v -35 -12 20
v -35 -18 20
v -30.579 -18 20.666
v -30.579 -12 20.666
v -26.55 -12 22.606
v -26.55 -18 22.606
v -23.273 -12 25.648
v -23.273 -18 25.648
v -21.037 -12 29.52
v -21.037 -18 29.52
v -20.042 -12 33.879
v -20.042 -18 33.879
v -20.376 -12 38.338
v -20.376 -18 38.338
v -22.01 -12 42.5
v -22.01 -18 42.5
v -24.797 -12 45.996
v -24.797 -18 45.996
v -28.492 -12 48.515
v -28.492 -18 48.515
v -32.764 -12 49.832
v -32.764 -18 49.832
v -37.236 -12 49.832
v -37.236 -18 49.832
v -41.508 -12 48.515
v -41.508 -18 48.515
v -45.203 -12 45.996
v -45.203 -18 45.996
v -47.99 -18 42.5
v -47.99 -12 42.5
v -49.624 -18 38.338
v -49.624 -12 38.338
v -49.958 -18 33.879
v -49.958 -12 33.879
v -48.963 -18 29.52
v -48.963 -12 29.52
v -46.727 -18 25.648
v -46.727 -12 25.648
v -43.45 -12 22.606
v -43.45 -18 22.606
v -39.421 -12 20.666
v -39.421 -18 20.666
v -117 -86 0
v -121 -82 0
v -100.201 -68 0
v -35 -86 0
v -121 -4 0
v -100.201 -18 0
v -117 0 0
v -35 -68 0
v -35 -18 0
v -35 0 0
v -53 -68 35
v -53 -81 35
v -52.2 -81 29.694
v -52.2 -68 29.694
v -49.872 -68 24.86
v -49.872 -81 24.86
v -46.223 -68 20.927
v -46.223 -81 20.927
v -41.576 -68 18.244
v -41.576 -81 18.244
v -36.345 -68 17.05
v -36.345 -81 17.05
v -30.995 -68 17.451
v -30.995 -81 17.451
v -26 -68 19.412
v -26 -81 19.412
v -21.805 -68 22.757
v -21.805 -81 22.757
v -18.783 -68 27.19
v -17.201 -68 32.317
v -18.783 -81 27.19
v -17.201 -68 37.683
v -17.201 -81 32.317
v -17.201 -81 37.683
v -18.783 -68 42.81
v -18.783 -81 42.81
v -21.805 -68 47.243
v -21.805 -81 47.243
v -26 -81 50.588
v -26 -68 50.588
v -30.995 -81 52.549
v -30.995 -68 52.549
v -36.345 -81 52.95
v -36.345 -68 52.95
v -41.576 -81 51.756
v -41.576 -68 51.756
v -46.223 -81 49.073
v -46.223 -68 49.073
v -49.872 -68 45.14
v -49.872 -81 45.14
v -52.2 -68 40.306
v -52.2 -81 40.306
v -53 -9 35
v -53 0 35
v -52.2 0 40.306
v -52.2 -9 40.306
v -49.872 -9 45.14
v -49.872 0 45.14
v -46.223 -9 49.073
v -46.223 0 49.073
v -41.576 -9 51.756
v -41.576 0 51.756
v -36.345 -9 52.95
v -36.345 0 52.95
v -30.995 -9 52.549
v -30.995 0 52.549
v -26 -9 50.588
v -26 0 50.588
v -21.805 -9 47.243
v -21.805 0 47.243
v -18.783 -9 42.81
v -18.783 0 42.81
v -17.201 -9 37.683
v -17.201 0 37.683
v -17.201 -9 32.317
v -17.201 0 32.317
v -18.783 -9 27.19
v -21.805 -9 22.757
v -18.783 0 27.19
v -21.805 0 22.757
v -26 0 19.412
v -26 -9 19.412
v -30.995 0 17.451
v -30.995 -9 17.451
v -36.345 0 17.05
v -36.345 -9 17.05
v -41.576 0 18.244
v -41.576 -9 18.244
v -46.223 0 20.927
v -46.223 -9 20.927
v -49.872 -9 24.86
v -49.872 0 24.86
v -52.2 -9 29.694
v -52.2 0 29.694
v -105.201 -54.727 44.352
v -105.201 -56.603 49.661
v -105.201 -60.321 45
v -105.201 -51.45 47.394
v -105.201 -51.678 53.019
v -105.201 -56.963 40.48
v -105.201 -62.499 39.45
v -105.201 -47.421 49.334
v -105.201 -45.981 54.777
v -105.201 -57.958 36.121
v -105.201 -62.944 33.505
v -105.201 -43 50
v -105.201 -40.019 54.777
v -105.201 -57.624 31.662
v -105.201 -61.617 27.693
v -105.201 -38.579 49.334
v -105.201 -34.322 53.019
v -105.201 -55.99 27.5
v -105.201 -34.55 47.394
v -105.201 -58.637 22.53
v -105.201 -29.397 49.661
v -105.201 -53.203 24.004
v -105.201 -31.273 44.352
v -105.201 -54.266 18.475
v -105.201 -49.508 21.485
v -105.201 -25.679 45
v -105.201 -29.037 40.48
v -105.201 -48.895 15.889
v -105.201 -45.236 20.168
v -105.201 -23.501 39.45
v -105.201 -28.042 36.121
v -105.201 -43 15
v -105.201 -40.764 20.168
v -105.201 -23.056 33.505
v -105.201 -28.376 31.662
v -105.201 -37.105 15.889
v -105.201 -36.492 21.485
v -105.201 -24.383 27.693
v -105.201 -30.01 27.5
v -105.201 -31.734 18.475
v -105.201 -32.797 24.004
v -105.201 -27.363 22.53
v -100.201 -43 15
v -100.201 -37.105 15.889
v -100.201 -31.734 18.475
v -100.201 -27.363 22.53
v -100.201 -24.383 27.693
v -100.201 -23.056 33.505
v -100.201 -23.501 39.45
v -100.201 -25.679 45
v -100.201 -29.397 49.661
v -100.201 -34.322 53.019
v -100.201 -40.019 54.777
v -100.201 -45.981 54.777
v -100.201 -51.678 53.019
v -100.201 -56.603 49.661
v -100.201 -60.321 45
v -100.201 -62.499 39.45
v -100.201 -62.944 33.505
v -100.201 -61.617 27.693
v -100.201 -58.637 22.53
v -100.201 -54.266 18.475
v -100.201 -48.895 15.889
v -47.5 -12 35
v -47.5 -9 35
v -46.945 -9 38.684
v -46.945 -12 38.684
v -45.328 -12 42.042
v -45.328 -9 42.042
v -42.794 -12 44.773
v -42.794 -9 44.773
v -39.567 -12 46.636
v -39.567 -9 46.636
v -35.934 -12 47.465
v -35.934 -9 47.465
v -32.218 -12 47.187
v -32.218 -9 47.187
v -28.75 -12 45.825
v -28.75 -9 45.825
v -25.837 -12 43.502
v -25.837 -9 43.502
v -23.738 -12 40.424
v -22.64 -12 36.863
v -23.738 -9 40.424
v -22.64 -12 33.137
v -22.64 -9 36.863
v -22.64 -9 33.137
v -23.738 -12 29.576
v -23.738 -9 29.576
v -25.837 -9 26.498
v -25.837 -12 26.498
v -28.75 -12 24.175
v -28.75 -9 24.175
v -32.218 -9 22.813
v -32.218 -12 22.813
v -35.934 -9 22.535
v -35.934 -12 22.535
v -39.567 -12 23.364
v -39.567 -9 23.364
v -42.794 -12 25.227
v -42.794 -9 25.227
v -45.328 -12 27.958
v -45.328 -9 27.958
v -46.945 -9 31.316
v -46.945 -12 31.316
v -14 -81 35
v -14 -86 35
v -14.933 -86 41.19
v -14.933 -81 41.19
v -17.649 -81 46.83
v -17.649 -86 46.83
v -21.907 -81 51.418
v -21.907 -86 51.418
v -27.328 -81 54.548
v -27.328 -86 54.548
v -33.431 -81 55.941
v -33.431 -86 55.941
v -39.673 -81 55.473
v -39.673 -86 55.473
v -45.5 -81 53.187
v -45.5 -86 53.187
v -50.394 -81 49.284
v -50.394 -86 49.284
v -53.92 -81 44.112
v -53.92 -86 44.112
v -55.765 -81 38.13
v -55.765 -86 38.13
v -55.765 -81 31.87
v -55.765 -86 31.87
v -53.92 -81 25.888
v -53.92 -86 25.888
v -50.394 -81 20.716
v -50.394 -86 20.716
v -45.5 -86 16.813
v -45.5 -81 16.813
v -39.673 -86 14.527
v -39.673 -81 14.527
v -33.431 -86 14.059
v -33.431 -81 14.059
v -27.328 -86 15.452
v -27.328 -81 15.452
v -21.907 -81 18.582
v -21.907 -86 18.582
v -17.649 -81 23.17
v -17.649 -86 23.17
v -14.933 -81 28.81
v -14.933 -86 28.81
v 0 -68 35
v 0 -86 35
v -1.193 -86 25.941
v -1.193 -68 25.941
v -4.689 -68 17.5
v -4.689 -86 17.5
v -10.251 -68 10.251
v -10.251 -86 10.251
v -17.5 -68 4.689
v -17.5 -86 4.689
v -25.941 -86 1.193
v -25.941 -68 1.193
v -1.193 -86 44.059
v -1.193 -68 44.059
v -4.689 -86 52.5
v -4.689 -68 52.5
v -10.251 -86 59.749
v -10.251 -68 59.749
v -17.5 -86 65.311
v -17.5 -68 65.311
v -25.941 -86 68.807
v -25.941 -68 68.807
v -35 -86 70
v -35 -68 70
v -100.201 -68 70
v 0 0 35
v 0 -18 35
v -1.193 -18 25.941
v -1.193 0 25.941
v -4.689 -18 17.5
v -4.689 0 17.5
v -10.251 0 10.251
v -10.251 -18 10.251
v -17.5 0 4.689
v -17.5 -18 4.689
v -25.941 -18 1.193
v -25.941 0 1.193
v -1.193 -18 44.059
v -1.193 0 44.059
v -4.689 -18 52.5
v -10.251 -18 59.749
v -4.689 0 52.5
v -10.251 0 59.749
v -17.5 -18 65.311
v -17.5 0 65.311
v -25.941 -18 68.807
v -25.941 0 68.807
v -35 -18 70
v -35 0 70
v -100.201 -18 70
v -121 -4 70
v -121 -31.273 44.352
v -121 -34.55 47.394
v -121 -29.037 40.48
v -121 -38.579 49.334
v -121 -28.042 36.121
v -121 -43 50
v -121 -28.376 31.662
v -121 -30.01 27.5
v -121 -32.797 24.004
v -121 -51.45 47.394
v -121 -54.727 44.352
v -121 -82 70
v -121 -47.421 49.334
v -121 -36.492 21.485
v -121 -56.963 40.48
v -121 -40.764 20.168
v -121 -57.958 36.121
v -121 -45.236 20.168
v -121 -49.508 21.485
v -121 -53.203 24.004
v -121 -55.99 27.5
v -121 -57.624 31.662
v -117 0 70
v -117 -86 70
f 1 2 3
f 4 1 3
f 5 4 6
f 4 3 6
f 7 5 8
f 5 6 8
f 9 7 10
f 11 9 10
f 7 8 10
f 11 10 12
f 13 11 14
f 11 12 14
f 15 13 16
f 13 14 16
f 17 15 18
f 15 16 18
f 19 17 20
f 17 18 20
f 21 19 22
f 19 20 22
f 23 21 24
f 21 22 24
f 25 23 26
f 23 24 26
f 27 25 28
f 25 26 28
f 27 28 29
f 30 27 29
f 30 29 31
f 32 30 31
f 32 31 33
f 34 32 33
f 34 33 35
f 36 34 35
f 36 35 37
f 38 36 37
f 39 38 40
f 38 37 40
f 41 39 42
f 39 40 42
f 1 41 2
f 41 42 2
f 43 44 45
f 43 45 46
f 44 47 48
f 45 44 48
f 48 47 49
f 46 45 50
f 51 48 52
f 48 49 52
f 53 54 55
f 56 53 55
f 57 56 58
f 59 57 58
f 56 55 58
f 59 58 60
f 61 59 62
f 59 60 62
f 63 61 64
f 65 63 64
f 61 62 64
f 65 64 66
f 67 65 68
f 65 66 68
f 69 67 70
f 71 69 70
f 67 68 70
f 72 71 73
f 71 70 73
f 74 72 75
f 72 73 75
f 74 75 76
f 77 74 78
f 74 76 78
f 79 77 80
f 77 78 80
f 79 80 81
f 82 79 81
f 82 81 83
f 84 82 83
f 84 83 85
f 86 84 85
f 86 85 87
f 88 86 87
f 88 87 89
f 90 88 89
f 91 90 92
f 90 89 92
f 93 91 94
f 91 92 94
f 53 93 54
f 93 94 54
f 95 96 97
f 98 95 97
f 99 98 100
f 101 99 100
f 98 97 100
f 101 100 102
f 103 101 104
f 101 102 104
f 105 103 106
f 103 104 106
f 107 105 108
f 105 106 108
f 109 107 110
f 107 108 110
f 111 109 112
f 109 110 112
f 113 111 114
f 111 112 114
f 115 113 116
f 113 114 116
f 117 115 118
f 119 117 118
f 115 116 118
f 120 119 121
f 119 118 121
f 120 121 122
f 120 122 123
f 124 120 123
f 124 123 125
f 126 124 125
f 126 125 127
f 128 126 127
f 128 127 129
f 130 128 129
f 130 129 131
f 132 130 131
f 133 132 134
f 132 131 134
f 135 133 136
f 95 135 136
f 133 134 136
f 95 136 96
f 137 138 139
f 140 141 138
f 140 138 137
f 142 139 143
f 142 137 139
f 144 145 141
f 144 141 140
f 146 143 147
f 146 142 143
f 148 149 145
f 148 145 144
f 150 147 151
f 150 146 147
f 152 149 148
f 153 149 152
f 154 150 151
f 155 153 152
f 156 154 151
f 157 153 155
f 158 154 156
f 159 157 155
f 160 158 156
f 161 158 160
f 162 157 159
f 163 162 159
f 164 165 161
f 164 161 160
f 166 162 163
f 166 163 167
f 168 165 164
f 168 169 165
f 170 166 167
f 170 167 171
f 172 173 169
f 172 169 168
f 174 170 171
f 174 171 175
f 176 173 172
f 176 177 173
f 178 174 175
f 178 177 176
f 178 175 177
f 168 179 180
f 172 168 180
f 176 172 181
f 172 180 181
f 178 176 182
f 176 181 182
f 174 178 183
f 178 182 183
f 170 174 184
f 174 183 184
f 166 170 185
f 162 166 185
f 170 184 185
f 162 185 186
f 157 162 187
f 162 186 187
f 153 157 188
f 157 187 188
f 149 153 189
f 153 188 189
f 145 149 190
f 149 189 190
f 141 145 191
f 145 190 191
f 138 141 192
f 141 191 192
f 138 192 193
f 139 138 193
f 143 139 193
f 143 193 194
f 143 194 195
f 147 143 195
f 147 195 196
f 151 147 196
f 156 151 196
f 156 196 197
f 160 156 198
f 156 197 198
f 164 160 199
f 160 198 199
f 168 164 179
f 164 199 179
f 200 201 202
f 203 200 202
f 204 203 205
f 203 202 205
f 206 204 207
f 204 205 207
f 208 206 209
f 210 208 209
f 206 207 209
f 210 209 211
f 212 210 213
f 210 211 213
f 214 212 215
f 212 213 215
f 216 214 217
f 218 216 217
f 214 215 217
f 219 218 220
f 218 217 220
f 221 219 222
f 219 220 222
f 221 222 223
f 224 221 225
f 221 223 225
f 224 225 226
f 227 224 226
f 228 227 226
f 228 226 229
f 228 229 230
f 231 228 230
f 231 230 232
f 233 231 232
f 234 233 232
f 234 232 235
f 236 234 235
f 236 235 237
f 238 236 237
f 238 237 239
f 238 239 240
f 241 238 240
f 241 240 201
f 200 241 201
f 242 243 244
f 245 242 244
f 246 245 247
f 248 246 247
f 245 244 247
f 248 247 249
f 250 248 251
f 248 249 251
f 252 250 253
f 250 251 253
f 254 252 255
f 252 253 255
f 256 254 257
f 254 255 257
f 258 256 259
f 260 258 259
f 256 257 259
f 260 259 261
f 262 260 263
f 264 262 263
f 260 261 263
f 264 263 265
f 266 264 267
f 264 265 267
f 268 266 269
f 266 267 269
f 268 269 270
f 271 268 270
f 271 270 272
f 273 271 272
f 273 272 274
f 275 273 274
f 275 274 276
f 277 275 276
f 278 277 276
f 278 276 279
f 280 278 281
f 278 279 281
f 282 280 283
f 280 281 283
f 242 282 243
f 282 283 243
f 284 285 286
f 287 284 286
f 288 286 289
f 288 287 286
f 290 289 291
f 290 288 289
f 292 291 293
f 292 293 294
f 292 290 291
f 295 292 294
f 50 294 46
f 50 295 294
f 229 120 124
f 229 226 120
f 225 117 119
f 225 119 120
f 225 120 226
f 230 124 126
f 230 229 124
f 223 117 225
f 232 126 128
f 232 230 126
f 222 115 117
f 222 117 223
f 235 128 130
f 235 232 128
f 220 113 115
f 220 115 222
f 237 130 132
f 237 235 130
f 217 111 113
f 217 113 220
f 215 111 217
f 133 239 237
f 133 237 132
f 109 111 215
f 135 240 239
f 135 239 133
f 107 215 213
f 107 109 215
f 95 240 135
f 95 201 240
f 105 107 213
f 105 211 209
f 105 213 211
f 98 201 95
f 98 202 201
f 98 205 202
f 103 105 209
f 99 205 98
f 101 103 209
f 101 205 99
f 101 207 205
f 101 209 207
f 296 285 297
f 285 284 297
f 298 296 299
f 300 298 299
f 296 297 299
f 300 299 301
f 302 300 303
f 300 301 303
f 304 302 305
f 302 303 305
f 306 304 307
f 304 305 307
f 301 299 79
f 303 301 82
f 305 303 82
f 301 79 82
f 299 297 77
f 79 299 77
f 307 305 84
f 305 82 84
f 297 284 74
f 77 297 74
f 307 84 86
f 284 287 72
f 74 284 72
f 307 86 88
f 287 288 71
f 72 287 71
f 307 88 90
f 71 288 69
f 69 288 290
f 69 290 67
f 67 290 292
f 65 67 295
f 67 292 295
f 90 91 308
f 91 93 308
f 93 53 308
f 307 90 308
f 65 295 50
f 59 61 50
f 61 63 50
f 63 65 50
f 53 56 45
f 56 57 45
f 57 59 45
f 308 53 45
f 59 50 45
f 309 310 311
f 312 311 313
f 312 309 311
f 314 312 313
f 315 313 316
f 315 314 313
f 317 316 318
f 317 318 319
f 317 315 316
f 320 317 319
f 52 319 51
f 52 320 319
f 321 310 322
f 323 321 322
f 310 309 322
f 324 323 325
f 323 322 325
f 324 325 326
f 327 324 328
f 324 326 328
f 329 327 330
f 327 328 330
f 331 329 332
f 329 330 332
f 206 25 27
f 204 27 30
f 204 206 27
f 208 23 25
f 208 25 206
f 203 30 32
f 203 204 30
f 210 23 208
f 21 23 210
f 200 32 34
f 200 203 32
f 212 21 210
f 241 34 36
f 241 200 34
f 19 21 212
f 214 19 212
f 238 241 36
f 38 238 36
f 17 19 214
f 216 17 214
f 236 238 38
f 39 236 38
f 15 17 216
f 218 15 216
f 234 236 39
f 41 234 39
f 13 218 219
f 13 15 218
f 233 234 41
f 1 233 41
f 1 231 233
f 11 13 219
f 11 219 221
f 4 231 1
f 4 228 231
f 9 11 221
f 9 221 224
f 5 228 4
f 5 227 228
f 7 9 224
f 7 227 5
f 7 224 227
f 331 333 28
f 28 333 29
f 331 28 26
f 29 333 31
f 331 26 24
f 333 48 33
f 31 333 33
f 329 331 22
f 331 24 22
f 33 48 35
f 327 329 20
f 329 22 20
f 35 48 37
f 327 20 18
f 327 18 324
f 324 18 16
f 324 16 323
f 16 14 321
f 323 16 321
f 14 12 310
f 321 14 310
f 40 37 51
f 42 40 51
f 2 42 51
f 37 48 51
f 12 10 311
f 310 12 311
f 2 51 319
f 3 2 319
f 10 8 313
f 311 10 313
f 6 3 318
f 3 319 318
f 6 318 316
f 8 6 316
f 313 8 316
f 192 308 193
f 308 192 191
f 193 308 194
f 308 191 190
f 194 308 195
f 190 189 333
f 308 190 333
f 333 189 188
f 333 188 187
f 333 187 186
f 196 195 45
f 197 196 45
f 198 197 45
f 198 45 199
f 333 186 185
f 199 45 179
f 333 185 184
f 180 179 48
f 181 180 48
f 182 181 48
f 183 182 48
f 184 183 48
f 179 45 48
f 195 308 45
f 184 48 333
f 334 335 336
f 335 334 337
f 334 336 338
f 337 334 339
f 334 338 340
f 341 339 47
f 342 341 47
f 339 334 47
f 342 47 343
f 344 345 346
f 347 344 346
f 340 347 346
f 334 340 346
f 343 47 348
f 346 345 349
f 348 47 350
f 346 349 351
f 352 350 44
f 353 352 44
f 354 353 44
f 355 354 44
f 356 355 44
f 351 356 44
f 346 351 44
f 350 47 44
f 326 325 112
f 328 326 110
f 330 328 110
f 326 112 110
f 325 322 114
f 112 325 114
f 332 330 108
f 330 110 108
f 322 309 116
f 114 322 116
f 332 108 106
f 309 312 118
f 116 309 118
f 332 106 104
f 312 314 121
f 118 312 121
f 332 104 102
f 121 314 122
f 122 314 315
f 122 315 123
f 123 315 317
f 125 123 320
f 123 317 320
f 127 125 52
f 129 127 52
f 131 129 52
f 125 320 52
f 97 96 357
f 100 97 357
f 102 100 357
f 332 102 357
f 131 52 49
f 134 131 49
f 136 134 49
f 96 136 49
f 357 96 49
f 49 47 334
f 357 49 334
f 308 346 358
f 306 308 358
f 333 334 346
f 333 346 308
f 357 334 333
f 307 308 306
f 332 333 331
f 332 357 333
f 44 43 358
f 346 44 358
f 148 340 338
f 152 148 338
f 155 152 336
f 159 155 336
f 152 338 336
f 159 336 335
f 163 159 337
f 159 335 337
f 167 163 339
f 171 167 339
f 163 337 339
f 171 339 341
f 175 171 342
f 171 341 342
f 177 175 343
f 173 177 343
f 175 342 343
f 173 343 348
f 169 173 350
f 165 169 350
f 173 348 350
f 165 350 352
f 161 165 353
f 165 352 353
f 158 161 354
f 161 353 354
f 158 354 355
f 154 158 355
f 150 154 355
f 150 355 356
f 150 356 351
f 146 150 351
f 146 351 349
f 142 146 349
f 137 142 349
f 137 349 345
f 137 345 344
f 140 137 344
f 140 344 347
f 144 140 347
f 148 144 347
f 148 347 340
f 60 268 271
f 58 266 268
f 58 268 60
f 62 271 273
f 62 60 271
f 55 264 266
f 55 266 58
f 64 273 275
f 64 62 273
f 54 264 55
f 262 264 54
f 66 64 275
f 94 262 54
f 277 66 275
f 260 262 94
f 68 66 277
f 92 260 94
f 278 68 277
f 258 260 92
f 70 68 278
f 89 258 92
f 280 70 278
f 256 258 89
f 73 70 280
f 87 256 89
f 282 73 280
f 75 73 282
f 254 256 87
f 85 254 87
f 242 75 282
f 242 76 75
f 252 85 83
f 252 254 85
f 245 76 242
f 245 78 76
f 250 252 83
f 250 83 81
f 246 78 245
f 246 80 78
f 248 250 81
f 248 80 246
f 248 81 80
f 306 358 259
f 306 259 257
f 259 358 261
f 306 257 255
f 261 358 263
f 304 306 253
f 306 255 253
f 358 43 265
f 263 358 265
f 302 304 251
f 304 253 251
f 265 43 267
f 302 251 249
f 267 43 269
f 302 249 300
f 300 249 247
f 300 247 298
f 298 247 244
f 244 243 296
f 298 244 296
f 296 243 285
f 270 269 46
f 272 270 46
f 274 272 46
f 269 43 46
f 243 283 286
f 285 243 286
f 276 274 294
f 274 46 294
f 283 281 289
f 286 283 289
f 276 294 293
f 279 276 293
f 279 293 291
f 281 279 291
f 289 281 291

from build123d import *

# Parameters (mm, degrees)
P_IDAT_VYSUNUT_M1_DEPTH  = 70
ZAOBLIT1_R               = 35
ODEBRAT_VYSUNUT_M2_REACH = 166.125
SKICA3_R                 = 15
SKICA5_R                 = 20
ODEBRAT_VYSUNUT_M3_DEPTH = 5
ODEBRAT_VYSUNUT_M4_REACH = 166.125
SKICA6_R                 = 12.5
SKICA7_R                 = 18
ODEBRAT_VYSUNUT_M5_DEPTH = 9
SKICA8_R                 = 15
ODEBRAT_VYSUNUT_M6_DEPTH = 6
ODEBRAT_VYSUNUT_M7_REACH = 166.125
SKICA9_R                 = 18
SKICA10_R                = 21
ODEBRAT_VYSUNUT_M8_DEPTH = 5
ZKOSEN_1_SIZE            = 4


with BuildPart() as part:
    # Skica2 → Přidat vysunutím1 (new body)
    with BuildSketch(Plane.XY):
        Polygon((0, 0), (-121, 0), (-121, -86), (0, -86), (0, -68), (-100.200761753, -68), (-100.200761753, -18), (0, -18), align=None)
    extrude(amount=P_IDAT_VYSUNUT_M1_DEPTH)

    # Zaoblit1
    zaoblit1_edges = [part.edges().sort_by_distance(p)[0] for p in [
        (0, -77, 70),
        (0, -77, 0),
        (0, -9, 70),
        (0, -9, 0),
    ]]
    fillet(zaoblit1_edges, radius=ZAOBLIT1_R - 0.0001)  # a hair under: the kernel refuses the full size

    # Skica3 → Odebrat vysunutím2 (cut, up to next)
    with BuildSketch(Plane.ZY.offset(121), mode=Mode.PRIVATE) as odebrat_vysunut_m2_sk1:
        with Locations((35, -43)):
            Circle(SKICA3_R)
    odebrat_vysunut_m2_tool1 = extrude(odebrat_vysunut_m2_sk1.sketch, amount=-ODEBRAT_VYSUNUT_M2_REACH, mode=Mode.PRIVATE) & part.part
    add(odebrat_vysunut_m2_tool1.solids().sort_by_distance((-121, -43, 35))[0], mode=Mode.SUBTRACT)

    # Skica5 → Odebrat vysunutím3 (cut)
    with BuildSketch(Plane(origin=(-100.200761753, 0, 0), x_dir=(0, 0, -1), z_dir=(1, 0, 0))):
        with Locations((-35, -43)):
            Circle(SKICA5_R)
    extrude(amount=-ODEBRAT_VYSUNUT_M3_DEPTH, mode=Mode.SUBTRACT)

    # Skica6 → Odebrat vysunutím4 (cut, up to next)
    with BuildSketch(Plane(origin=(0, 0, 0), x_dir=(1, 0, 0), z_dir=(0, 1, 0)), mode=Mode.PRIVATE) as odebrat_vysunut_m4_sk1:
        with Locations(Location((-35, -35, 0), (0, 0, 180))):
            Circle(SKICA6_R)
    odebrat_vysunut_m4_tool1 = extrude(odebrat_vysunut_m4_sk1.sketch, amount=-ODEBRAT_VYSUNUT_M4_REACH, mode=Mode.PRIVATE) & part.part
    add(odebrat_vysunut_m4_tool1.solids().sort_by_distance((-35, 0, 35))[0], mode=Mode.SUBTRACT)

    # Skica7 → Odebrat vysunutím5 (cut)
    with BuildSketch(Plane(origin=(0, 0, 0), x_dir=(1, 0, 0), z_dir=(0, 1, 0))):
        with Locations(Location((-35, -35, 0), (0, 0, 180))):
            Circle(SKICA7_R)
    extrude(amount=-ODEBRAT_VYSUNUT_M5_DEPTH, mode=Mode.SUBTRACT)

    # Skica8 → Odebrat vysunutím6 (cut)
    with BuildSketch(Plane.XZ.offset(18)):
        with Locations(Location((-35, 35, 0), (0, 0, 270))):
            Circle(SKICA8_R)
    extrude(amount=-ODEBRAT_VYSUNUT_M6_DEPTH, mode=Mode.SUBTRACT)

    # Skica9 → Odebrat vysunutím7 (cut, up to next)
    with BuildSketch(Plane.XZ.offset(86), mode=Mode.PRIVATE) as odebrat_vysunut_m7_sk1:
        with Locations(Location((-35, 35, 0), (0, 0, 180))):
            Circle(SKICA9_R)
    odebrat_vysunut_m7_tool1 = extrude(odebrat_vysunut_m7_sk1.sketch, amount=-ODEBRAT_VYSUNUT_M7_REACH, mode=Mode.PRIVATE) & part.part
    add(odebrat_vysunut_m7_tool1.solids().sort_by_distance((-35, -86, 35))[0], mode=Mode.SUBTRACT)

    # Skica10 → Odebrat vysunutím8 (cut)
    with BuildSketch(Plane.XZ.offset(86)):
        with Locations((-35, 35)):
            Circle(SKICA10_R)
    extrude(amount=-ODEBRAT_VYSUNUT_M8_DEPTH, mode=Mode.SUBTRACT)

    # Zkosení1
    zkosen_1_edges = [part.edges().sort_by_distance(p)[0] for p in [
        (-121, -86, 35),
        (-121, 0, 35),
    ]]
    chamfer(zkosen_1_edges, length=ZKOSEN_1_SIZE)


solid = part.part
